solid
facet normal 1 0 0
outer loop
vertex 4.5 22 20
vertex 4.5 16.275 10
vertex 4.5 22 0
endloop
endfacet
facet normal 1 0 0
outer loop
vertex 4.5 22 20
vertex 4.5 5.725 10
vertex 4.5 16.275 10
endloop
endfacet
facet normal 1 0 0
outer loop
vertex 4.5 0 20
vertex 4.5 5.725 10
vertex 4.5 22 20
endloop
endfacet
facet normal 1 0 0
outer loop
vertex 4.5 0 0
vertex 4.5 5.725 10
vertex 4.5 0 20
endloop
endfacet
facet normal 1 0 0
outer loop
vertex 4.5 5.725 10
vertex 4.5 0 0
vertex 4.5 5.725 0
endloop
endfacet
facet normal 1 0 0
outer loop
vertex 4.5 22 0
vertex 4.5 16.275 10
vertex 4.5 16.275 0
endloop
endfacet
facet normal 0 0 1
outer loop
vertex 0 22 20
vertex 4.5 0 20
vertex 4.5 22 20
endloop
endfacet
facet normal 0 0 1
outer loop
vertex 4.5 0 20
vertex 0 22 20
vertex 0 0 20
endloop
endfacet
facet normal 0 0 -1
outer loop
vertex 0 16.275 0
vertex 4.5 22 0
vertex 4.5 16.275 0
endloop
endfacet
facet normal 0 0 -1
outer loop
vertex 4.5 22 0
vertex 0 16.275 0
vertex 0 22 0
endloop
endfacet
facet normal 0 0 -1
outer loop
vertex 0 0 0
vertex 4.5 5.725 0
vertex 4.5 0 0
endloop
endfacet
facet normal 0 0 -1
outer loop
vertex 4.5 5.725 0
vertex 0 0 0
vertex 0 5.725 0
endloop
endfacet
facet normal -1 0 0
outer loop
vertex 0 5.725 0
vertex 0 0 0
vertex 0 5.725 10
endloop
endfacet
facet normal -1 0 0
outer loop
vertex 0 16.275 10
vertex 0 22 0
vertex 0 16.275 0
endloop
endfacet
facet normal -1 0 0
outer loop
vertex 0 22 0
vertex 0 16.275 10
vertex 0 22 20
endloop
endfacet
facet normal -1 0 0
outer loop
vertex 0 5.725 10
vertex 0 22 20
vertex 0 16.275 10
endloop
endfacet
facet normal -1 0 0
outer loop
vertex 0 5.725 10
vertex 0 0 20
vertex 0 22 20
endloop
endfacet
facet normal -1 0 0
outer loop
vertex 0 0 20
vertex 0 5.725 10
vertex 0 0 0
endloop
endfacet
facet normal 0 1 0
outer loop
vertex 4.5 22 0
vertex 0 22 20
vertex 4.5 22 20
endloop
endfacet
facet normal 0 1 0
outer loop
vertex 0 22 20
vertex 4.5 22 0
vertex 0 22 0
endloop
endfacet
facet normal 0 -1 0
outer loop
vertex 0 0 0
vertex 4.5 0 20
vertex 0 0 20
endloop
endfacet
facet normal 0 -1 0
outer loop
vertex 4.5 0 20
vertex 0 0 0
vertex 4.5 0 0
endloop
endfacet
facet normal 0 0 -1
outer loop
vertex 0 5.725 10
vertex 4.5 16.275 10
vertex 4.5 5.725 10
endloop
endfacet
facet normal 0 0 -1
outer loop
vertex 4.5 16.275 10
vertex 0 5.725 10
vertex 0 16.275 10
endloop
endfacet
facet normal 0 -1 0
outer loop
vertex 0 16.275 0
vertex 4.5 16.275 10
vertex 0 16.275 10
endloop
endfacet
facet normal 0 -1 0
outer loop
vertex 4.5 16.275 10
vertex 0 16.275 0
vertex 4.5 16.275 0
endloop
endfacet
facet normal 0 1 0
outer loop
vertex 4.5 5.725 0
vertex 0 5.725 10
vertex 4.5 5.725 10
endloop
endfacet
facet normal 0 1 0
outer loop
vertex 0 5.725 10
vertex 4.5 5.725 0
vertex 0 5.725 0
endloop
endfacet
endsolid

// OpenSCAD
// file: clip.scad
EPSILON=.05;
TOLERANCE=.5;

bagW=140;
slotO=5;
slotW=5;
slotD=6;
slotAssemblyW=2*slotO*slotW;

clipW=2*slotAssemblyW + bagW;
clipD=10;
clipH=10;

notchOpening=5;
notchOpeningH=clipH - 2*notchOpening;
notchSide=sqrt(notchOpening*notchOpening/2);

gapD=2;

lockW=slotW - TOLERANCE;
lockD=2*clipD+gapD;
lockH=2*clipH;
lockHoleD=2*(clipD-slotD)+gapD+EPSILON+TOLERANCE;

module slot(eps, tol) {
    translate([-slotW/2,
               -slotD/2,
               -eps])
        cube([slotW+tol, 
              slotD+tol, 
              clipH+2*eps]);
}

module unnotched() {
    difference() {
        translate([-clipW/2, 0, 0]) {
            cube([clipW, clipD, clipH]);
        }
        translate([-(clipW/2-slotW/2-slotO), slotD/2-EPSILON, 0]) {
            slot(eps=EPSILON, tol=TOLERANCE);
        }
        translate([(clipW/2-slotW/2-slotO), slotD/2-EPSILON, 0]) {
            slot(eps=EPSILON, tol=TOLERANCE);
        }
    }
}

module notch(eps=EPSILON) {
    translate([0, clipD, clipH/2]) {
        rotate([45, 0, 0]) {
            cube([clipW+eps, notchSide, notchSide], center=true);
        }
    }
}

module negative() {
    difference() {
        unnotched();
        notch();
    }
}

module positive() {
    union() {
        unnotched();
        notch(eps=0);
    }
}

module lock() {
    difference() {
        cube([lockW, lockD, lockH]);
        translate([-EPSILON, (lockD-lockHoleD)/2, -EPSILON]) {
            cube([lockW+2*EPSILON,
                  lockHoleD,
                  clipH+EPSILON]);
        }
    }
}

previewGapD=gapD/2;

npreviewX=0;
npreviewY=-clipD-previewGapD;
npreviewZ=0;

ppreviewX=0;
ppreviewY=clipD+previewGapD;
ppreviewZ=0;

lpreviewX=-clipW/2+slotO;
lpreviewY=-(clipD + gapD/2);
lpreviewZ=1.1*clipH+EPSILON;

if ($preview) {
    translate([npreviewX, npreviewY, npreviewZ]) {
        negative();
    }
    translate([ppreviewX, ppreviewY, ppreviewZ]) {
        translate([0, 0, clipH]) {
            rotate([180, 0, 0]) {
                positive();
            }
        }
    }
    translate([lpreviewX, lpreviewY, lpreviewZ]) {
        lock();
    }
}

//
// This program is free software: you can redistribute it and/or modify it 
// under the terms of the GNU General Public License as published by the 
// Free Software Foundation, either version 3 of the License, or (at your option) any later version.
//
// This program is distributed in the hope that it will be useful, but 
// WITHOUT ANY WARRANTY; without even the implied warranty of 
// MERCHANTABILITY or FITNESS FOR A PARTICULAR PURPOSE. 
// See the GNU General Public License for more details.
//
// You should have received a copy of the GNU General Public License 
// along with this program. If not, see <https://www.gnu.org/licenses/>.
//
// main file
include <clip.scad>

lock();

//
// This program is free software: you can redistribute it and/or modify it 
// under the terms of the GNU General Public License as published by the 
// Free Software Foundation, either version 3 of the License, or (at your option) any later version.
//
// This program is distributed in the hope that it will be useful, but 
// WITHOUT ANY WARRANTY; without even the implied warranty of 
// MERCHANTABILITY or FITNESS FOR A PARTICULAR PURPOSE. 
// See the GNU General Public License for more details.
//
// You should have received a copy of the GNU General Public License 
// along with this program. If not, see <https://www.gnu.org/licenses/>.
//
